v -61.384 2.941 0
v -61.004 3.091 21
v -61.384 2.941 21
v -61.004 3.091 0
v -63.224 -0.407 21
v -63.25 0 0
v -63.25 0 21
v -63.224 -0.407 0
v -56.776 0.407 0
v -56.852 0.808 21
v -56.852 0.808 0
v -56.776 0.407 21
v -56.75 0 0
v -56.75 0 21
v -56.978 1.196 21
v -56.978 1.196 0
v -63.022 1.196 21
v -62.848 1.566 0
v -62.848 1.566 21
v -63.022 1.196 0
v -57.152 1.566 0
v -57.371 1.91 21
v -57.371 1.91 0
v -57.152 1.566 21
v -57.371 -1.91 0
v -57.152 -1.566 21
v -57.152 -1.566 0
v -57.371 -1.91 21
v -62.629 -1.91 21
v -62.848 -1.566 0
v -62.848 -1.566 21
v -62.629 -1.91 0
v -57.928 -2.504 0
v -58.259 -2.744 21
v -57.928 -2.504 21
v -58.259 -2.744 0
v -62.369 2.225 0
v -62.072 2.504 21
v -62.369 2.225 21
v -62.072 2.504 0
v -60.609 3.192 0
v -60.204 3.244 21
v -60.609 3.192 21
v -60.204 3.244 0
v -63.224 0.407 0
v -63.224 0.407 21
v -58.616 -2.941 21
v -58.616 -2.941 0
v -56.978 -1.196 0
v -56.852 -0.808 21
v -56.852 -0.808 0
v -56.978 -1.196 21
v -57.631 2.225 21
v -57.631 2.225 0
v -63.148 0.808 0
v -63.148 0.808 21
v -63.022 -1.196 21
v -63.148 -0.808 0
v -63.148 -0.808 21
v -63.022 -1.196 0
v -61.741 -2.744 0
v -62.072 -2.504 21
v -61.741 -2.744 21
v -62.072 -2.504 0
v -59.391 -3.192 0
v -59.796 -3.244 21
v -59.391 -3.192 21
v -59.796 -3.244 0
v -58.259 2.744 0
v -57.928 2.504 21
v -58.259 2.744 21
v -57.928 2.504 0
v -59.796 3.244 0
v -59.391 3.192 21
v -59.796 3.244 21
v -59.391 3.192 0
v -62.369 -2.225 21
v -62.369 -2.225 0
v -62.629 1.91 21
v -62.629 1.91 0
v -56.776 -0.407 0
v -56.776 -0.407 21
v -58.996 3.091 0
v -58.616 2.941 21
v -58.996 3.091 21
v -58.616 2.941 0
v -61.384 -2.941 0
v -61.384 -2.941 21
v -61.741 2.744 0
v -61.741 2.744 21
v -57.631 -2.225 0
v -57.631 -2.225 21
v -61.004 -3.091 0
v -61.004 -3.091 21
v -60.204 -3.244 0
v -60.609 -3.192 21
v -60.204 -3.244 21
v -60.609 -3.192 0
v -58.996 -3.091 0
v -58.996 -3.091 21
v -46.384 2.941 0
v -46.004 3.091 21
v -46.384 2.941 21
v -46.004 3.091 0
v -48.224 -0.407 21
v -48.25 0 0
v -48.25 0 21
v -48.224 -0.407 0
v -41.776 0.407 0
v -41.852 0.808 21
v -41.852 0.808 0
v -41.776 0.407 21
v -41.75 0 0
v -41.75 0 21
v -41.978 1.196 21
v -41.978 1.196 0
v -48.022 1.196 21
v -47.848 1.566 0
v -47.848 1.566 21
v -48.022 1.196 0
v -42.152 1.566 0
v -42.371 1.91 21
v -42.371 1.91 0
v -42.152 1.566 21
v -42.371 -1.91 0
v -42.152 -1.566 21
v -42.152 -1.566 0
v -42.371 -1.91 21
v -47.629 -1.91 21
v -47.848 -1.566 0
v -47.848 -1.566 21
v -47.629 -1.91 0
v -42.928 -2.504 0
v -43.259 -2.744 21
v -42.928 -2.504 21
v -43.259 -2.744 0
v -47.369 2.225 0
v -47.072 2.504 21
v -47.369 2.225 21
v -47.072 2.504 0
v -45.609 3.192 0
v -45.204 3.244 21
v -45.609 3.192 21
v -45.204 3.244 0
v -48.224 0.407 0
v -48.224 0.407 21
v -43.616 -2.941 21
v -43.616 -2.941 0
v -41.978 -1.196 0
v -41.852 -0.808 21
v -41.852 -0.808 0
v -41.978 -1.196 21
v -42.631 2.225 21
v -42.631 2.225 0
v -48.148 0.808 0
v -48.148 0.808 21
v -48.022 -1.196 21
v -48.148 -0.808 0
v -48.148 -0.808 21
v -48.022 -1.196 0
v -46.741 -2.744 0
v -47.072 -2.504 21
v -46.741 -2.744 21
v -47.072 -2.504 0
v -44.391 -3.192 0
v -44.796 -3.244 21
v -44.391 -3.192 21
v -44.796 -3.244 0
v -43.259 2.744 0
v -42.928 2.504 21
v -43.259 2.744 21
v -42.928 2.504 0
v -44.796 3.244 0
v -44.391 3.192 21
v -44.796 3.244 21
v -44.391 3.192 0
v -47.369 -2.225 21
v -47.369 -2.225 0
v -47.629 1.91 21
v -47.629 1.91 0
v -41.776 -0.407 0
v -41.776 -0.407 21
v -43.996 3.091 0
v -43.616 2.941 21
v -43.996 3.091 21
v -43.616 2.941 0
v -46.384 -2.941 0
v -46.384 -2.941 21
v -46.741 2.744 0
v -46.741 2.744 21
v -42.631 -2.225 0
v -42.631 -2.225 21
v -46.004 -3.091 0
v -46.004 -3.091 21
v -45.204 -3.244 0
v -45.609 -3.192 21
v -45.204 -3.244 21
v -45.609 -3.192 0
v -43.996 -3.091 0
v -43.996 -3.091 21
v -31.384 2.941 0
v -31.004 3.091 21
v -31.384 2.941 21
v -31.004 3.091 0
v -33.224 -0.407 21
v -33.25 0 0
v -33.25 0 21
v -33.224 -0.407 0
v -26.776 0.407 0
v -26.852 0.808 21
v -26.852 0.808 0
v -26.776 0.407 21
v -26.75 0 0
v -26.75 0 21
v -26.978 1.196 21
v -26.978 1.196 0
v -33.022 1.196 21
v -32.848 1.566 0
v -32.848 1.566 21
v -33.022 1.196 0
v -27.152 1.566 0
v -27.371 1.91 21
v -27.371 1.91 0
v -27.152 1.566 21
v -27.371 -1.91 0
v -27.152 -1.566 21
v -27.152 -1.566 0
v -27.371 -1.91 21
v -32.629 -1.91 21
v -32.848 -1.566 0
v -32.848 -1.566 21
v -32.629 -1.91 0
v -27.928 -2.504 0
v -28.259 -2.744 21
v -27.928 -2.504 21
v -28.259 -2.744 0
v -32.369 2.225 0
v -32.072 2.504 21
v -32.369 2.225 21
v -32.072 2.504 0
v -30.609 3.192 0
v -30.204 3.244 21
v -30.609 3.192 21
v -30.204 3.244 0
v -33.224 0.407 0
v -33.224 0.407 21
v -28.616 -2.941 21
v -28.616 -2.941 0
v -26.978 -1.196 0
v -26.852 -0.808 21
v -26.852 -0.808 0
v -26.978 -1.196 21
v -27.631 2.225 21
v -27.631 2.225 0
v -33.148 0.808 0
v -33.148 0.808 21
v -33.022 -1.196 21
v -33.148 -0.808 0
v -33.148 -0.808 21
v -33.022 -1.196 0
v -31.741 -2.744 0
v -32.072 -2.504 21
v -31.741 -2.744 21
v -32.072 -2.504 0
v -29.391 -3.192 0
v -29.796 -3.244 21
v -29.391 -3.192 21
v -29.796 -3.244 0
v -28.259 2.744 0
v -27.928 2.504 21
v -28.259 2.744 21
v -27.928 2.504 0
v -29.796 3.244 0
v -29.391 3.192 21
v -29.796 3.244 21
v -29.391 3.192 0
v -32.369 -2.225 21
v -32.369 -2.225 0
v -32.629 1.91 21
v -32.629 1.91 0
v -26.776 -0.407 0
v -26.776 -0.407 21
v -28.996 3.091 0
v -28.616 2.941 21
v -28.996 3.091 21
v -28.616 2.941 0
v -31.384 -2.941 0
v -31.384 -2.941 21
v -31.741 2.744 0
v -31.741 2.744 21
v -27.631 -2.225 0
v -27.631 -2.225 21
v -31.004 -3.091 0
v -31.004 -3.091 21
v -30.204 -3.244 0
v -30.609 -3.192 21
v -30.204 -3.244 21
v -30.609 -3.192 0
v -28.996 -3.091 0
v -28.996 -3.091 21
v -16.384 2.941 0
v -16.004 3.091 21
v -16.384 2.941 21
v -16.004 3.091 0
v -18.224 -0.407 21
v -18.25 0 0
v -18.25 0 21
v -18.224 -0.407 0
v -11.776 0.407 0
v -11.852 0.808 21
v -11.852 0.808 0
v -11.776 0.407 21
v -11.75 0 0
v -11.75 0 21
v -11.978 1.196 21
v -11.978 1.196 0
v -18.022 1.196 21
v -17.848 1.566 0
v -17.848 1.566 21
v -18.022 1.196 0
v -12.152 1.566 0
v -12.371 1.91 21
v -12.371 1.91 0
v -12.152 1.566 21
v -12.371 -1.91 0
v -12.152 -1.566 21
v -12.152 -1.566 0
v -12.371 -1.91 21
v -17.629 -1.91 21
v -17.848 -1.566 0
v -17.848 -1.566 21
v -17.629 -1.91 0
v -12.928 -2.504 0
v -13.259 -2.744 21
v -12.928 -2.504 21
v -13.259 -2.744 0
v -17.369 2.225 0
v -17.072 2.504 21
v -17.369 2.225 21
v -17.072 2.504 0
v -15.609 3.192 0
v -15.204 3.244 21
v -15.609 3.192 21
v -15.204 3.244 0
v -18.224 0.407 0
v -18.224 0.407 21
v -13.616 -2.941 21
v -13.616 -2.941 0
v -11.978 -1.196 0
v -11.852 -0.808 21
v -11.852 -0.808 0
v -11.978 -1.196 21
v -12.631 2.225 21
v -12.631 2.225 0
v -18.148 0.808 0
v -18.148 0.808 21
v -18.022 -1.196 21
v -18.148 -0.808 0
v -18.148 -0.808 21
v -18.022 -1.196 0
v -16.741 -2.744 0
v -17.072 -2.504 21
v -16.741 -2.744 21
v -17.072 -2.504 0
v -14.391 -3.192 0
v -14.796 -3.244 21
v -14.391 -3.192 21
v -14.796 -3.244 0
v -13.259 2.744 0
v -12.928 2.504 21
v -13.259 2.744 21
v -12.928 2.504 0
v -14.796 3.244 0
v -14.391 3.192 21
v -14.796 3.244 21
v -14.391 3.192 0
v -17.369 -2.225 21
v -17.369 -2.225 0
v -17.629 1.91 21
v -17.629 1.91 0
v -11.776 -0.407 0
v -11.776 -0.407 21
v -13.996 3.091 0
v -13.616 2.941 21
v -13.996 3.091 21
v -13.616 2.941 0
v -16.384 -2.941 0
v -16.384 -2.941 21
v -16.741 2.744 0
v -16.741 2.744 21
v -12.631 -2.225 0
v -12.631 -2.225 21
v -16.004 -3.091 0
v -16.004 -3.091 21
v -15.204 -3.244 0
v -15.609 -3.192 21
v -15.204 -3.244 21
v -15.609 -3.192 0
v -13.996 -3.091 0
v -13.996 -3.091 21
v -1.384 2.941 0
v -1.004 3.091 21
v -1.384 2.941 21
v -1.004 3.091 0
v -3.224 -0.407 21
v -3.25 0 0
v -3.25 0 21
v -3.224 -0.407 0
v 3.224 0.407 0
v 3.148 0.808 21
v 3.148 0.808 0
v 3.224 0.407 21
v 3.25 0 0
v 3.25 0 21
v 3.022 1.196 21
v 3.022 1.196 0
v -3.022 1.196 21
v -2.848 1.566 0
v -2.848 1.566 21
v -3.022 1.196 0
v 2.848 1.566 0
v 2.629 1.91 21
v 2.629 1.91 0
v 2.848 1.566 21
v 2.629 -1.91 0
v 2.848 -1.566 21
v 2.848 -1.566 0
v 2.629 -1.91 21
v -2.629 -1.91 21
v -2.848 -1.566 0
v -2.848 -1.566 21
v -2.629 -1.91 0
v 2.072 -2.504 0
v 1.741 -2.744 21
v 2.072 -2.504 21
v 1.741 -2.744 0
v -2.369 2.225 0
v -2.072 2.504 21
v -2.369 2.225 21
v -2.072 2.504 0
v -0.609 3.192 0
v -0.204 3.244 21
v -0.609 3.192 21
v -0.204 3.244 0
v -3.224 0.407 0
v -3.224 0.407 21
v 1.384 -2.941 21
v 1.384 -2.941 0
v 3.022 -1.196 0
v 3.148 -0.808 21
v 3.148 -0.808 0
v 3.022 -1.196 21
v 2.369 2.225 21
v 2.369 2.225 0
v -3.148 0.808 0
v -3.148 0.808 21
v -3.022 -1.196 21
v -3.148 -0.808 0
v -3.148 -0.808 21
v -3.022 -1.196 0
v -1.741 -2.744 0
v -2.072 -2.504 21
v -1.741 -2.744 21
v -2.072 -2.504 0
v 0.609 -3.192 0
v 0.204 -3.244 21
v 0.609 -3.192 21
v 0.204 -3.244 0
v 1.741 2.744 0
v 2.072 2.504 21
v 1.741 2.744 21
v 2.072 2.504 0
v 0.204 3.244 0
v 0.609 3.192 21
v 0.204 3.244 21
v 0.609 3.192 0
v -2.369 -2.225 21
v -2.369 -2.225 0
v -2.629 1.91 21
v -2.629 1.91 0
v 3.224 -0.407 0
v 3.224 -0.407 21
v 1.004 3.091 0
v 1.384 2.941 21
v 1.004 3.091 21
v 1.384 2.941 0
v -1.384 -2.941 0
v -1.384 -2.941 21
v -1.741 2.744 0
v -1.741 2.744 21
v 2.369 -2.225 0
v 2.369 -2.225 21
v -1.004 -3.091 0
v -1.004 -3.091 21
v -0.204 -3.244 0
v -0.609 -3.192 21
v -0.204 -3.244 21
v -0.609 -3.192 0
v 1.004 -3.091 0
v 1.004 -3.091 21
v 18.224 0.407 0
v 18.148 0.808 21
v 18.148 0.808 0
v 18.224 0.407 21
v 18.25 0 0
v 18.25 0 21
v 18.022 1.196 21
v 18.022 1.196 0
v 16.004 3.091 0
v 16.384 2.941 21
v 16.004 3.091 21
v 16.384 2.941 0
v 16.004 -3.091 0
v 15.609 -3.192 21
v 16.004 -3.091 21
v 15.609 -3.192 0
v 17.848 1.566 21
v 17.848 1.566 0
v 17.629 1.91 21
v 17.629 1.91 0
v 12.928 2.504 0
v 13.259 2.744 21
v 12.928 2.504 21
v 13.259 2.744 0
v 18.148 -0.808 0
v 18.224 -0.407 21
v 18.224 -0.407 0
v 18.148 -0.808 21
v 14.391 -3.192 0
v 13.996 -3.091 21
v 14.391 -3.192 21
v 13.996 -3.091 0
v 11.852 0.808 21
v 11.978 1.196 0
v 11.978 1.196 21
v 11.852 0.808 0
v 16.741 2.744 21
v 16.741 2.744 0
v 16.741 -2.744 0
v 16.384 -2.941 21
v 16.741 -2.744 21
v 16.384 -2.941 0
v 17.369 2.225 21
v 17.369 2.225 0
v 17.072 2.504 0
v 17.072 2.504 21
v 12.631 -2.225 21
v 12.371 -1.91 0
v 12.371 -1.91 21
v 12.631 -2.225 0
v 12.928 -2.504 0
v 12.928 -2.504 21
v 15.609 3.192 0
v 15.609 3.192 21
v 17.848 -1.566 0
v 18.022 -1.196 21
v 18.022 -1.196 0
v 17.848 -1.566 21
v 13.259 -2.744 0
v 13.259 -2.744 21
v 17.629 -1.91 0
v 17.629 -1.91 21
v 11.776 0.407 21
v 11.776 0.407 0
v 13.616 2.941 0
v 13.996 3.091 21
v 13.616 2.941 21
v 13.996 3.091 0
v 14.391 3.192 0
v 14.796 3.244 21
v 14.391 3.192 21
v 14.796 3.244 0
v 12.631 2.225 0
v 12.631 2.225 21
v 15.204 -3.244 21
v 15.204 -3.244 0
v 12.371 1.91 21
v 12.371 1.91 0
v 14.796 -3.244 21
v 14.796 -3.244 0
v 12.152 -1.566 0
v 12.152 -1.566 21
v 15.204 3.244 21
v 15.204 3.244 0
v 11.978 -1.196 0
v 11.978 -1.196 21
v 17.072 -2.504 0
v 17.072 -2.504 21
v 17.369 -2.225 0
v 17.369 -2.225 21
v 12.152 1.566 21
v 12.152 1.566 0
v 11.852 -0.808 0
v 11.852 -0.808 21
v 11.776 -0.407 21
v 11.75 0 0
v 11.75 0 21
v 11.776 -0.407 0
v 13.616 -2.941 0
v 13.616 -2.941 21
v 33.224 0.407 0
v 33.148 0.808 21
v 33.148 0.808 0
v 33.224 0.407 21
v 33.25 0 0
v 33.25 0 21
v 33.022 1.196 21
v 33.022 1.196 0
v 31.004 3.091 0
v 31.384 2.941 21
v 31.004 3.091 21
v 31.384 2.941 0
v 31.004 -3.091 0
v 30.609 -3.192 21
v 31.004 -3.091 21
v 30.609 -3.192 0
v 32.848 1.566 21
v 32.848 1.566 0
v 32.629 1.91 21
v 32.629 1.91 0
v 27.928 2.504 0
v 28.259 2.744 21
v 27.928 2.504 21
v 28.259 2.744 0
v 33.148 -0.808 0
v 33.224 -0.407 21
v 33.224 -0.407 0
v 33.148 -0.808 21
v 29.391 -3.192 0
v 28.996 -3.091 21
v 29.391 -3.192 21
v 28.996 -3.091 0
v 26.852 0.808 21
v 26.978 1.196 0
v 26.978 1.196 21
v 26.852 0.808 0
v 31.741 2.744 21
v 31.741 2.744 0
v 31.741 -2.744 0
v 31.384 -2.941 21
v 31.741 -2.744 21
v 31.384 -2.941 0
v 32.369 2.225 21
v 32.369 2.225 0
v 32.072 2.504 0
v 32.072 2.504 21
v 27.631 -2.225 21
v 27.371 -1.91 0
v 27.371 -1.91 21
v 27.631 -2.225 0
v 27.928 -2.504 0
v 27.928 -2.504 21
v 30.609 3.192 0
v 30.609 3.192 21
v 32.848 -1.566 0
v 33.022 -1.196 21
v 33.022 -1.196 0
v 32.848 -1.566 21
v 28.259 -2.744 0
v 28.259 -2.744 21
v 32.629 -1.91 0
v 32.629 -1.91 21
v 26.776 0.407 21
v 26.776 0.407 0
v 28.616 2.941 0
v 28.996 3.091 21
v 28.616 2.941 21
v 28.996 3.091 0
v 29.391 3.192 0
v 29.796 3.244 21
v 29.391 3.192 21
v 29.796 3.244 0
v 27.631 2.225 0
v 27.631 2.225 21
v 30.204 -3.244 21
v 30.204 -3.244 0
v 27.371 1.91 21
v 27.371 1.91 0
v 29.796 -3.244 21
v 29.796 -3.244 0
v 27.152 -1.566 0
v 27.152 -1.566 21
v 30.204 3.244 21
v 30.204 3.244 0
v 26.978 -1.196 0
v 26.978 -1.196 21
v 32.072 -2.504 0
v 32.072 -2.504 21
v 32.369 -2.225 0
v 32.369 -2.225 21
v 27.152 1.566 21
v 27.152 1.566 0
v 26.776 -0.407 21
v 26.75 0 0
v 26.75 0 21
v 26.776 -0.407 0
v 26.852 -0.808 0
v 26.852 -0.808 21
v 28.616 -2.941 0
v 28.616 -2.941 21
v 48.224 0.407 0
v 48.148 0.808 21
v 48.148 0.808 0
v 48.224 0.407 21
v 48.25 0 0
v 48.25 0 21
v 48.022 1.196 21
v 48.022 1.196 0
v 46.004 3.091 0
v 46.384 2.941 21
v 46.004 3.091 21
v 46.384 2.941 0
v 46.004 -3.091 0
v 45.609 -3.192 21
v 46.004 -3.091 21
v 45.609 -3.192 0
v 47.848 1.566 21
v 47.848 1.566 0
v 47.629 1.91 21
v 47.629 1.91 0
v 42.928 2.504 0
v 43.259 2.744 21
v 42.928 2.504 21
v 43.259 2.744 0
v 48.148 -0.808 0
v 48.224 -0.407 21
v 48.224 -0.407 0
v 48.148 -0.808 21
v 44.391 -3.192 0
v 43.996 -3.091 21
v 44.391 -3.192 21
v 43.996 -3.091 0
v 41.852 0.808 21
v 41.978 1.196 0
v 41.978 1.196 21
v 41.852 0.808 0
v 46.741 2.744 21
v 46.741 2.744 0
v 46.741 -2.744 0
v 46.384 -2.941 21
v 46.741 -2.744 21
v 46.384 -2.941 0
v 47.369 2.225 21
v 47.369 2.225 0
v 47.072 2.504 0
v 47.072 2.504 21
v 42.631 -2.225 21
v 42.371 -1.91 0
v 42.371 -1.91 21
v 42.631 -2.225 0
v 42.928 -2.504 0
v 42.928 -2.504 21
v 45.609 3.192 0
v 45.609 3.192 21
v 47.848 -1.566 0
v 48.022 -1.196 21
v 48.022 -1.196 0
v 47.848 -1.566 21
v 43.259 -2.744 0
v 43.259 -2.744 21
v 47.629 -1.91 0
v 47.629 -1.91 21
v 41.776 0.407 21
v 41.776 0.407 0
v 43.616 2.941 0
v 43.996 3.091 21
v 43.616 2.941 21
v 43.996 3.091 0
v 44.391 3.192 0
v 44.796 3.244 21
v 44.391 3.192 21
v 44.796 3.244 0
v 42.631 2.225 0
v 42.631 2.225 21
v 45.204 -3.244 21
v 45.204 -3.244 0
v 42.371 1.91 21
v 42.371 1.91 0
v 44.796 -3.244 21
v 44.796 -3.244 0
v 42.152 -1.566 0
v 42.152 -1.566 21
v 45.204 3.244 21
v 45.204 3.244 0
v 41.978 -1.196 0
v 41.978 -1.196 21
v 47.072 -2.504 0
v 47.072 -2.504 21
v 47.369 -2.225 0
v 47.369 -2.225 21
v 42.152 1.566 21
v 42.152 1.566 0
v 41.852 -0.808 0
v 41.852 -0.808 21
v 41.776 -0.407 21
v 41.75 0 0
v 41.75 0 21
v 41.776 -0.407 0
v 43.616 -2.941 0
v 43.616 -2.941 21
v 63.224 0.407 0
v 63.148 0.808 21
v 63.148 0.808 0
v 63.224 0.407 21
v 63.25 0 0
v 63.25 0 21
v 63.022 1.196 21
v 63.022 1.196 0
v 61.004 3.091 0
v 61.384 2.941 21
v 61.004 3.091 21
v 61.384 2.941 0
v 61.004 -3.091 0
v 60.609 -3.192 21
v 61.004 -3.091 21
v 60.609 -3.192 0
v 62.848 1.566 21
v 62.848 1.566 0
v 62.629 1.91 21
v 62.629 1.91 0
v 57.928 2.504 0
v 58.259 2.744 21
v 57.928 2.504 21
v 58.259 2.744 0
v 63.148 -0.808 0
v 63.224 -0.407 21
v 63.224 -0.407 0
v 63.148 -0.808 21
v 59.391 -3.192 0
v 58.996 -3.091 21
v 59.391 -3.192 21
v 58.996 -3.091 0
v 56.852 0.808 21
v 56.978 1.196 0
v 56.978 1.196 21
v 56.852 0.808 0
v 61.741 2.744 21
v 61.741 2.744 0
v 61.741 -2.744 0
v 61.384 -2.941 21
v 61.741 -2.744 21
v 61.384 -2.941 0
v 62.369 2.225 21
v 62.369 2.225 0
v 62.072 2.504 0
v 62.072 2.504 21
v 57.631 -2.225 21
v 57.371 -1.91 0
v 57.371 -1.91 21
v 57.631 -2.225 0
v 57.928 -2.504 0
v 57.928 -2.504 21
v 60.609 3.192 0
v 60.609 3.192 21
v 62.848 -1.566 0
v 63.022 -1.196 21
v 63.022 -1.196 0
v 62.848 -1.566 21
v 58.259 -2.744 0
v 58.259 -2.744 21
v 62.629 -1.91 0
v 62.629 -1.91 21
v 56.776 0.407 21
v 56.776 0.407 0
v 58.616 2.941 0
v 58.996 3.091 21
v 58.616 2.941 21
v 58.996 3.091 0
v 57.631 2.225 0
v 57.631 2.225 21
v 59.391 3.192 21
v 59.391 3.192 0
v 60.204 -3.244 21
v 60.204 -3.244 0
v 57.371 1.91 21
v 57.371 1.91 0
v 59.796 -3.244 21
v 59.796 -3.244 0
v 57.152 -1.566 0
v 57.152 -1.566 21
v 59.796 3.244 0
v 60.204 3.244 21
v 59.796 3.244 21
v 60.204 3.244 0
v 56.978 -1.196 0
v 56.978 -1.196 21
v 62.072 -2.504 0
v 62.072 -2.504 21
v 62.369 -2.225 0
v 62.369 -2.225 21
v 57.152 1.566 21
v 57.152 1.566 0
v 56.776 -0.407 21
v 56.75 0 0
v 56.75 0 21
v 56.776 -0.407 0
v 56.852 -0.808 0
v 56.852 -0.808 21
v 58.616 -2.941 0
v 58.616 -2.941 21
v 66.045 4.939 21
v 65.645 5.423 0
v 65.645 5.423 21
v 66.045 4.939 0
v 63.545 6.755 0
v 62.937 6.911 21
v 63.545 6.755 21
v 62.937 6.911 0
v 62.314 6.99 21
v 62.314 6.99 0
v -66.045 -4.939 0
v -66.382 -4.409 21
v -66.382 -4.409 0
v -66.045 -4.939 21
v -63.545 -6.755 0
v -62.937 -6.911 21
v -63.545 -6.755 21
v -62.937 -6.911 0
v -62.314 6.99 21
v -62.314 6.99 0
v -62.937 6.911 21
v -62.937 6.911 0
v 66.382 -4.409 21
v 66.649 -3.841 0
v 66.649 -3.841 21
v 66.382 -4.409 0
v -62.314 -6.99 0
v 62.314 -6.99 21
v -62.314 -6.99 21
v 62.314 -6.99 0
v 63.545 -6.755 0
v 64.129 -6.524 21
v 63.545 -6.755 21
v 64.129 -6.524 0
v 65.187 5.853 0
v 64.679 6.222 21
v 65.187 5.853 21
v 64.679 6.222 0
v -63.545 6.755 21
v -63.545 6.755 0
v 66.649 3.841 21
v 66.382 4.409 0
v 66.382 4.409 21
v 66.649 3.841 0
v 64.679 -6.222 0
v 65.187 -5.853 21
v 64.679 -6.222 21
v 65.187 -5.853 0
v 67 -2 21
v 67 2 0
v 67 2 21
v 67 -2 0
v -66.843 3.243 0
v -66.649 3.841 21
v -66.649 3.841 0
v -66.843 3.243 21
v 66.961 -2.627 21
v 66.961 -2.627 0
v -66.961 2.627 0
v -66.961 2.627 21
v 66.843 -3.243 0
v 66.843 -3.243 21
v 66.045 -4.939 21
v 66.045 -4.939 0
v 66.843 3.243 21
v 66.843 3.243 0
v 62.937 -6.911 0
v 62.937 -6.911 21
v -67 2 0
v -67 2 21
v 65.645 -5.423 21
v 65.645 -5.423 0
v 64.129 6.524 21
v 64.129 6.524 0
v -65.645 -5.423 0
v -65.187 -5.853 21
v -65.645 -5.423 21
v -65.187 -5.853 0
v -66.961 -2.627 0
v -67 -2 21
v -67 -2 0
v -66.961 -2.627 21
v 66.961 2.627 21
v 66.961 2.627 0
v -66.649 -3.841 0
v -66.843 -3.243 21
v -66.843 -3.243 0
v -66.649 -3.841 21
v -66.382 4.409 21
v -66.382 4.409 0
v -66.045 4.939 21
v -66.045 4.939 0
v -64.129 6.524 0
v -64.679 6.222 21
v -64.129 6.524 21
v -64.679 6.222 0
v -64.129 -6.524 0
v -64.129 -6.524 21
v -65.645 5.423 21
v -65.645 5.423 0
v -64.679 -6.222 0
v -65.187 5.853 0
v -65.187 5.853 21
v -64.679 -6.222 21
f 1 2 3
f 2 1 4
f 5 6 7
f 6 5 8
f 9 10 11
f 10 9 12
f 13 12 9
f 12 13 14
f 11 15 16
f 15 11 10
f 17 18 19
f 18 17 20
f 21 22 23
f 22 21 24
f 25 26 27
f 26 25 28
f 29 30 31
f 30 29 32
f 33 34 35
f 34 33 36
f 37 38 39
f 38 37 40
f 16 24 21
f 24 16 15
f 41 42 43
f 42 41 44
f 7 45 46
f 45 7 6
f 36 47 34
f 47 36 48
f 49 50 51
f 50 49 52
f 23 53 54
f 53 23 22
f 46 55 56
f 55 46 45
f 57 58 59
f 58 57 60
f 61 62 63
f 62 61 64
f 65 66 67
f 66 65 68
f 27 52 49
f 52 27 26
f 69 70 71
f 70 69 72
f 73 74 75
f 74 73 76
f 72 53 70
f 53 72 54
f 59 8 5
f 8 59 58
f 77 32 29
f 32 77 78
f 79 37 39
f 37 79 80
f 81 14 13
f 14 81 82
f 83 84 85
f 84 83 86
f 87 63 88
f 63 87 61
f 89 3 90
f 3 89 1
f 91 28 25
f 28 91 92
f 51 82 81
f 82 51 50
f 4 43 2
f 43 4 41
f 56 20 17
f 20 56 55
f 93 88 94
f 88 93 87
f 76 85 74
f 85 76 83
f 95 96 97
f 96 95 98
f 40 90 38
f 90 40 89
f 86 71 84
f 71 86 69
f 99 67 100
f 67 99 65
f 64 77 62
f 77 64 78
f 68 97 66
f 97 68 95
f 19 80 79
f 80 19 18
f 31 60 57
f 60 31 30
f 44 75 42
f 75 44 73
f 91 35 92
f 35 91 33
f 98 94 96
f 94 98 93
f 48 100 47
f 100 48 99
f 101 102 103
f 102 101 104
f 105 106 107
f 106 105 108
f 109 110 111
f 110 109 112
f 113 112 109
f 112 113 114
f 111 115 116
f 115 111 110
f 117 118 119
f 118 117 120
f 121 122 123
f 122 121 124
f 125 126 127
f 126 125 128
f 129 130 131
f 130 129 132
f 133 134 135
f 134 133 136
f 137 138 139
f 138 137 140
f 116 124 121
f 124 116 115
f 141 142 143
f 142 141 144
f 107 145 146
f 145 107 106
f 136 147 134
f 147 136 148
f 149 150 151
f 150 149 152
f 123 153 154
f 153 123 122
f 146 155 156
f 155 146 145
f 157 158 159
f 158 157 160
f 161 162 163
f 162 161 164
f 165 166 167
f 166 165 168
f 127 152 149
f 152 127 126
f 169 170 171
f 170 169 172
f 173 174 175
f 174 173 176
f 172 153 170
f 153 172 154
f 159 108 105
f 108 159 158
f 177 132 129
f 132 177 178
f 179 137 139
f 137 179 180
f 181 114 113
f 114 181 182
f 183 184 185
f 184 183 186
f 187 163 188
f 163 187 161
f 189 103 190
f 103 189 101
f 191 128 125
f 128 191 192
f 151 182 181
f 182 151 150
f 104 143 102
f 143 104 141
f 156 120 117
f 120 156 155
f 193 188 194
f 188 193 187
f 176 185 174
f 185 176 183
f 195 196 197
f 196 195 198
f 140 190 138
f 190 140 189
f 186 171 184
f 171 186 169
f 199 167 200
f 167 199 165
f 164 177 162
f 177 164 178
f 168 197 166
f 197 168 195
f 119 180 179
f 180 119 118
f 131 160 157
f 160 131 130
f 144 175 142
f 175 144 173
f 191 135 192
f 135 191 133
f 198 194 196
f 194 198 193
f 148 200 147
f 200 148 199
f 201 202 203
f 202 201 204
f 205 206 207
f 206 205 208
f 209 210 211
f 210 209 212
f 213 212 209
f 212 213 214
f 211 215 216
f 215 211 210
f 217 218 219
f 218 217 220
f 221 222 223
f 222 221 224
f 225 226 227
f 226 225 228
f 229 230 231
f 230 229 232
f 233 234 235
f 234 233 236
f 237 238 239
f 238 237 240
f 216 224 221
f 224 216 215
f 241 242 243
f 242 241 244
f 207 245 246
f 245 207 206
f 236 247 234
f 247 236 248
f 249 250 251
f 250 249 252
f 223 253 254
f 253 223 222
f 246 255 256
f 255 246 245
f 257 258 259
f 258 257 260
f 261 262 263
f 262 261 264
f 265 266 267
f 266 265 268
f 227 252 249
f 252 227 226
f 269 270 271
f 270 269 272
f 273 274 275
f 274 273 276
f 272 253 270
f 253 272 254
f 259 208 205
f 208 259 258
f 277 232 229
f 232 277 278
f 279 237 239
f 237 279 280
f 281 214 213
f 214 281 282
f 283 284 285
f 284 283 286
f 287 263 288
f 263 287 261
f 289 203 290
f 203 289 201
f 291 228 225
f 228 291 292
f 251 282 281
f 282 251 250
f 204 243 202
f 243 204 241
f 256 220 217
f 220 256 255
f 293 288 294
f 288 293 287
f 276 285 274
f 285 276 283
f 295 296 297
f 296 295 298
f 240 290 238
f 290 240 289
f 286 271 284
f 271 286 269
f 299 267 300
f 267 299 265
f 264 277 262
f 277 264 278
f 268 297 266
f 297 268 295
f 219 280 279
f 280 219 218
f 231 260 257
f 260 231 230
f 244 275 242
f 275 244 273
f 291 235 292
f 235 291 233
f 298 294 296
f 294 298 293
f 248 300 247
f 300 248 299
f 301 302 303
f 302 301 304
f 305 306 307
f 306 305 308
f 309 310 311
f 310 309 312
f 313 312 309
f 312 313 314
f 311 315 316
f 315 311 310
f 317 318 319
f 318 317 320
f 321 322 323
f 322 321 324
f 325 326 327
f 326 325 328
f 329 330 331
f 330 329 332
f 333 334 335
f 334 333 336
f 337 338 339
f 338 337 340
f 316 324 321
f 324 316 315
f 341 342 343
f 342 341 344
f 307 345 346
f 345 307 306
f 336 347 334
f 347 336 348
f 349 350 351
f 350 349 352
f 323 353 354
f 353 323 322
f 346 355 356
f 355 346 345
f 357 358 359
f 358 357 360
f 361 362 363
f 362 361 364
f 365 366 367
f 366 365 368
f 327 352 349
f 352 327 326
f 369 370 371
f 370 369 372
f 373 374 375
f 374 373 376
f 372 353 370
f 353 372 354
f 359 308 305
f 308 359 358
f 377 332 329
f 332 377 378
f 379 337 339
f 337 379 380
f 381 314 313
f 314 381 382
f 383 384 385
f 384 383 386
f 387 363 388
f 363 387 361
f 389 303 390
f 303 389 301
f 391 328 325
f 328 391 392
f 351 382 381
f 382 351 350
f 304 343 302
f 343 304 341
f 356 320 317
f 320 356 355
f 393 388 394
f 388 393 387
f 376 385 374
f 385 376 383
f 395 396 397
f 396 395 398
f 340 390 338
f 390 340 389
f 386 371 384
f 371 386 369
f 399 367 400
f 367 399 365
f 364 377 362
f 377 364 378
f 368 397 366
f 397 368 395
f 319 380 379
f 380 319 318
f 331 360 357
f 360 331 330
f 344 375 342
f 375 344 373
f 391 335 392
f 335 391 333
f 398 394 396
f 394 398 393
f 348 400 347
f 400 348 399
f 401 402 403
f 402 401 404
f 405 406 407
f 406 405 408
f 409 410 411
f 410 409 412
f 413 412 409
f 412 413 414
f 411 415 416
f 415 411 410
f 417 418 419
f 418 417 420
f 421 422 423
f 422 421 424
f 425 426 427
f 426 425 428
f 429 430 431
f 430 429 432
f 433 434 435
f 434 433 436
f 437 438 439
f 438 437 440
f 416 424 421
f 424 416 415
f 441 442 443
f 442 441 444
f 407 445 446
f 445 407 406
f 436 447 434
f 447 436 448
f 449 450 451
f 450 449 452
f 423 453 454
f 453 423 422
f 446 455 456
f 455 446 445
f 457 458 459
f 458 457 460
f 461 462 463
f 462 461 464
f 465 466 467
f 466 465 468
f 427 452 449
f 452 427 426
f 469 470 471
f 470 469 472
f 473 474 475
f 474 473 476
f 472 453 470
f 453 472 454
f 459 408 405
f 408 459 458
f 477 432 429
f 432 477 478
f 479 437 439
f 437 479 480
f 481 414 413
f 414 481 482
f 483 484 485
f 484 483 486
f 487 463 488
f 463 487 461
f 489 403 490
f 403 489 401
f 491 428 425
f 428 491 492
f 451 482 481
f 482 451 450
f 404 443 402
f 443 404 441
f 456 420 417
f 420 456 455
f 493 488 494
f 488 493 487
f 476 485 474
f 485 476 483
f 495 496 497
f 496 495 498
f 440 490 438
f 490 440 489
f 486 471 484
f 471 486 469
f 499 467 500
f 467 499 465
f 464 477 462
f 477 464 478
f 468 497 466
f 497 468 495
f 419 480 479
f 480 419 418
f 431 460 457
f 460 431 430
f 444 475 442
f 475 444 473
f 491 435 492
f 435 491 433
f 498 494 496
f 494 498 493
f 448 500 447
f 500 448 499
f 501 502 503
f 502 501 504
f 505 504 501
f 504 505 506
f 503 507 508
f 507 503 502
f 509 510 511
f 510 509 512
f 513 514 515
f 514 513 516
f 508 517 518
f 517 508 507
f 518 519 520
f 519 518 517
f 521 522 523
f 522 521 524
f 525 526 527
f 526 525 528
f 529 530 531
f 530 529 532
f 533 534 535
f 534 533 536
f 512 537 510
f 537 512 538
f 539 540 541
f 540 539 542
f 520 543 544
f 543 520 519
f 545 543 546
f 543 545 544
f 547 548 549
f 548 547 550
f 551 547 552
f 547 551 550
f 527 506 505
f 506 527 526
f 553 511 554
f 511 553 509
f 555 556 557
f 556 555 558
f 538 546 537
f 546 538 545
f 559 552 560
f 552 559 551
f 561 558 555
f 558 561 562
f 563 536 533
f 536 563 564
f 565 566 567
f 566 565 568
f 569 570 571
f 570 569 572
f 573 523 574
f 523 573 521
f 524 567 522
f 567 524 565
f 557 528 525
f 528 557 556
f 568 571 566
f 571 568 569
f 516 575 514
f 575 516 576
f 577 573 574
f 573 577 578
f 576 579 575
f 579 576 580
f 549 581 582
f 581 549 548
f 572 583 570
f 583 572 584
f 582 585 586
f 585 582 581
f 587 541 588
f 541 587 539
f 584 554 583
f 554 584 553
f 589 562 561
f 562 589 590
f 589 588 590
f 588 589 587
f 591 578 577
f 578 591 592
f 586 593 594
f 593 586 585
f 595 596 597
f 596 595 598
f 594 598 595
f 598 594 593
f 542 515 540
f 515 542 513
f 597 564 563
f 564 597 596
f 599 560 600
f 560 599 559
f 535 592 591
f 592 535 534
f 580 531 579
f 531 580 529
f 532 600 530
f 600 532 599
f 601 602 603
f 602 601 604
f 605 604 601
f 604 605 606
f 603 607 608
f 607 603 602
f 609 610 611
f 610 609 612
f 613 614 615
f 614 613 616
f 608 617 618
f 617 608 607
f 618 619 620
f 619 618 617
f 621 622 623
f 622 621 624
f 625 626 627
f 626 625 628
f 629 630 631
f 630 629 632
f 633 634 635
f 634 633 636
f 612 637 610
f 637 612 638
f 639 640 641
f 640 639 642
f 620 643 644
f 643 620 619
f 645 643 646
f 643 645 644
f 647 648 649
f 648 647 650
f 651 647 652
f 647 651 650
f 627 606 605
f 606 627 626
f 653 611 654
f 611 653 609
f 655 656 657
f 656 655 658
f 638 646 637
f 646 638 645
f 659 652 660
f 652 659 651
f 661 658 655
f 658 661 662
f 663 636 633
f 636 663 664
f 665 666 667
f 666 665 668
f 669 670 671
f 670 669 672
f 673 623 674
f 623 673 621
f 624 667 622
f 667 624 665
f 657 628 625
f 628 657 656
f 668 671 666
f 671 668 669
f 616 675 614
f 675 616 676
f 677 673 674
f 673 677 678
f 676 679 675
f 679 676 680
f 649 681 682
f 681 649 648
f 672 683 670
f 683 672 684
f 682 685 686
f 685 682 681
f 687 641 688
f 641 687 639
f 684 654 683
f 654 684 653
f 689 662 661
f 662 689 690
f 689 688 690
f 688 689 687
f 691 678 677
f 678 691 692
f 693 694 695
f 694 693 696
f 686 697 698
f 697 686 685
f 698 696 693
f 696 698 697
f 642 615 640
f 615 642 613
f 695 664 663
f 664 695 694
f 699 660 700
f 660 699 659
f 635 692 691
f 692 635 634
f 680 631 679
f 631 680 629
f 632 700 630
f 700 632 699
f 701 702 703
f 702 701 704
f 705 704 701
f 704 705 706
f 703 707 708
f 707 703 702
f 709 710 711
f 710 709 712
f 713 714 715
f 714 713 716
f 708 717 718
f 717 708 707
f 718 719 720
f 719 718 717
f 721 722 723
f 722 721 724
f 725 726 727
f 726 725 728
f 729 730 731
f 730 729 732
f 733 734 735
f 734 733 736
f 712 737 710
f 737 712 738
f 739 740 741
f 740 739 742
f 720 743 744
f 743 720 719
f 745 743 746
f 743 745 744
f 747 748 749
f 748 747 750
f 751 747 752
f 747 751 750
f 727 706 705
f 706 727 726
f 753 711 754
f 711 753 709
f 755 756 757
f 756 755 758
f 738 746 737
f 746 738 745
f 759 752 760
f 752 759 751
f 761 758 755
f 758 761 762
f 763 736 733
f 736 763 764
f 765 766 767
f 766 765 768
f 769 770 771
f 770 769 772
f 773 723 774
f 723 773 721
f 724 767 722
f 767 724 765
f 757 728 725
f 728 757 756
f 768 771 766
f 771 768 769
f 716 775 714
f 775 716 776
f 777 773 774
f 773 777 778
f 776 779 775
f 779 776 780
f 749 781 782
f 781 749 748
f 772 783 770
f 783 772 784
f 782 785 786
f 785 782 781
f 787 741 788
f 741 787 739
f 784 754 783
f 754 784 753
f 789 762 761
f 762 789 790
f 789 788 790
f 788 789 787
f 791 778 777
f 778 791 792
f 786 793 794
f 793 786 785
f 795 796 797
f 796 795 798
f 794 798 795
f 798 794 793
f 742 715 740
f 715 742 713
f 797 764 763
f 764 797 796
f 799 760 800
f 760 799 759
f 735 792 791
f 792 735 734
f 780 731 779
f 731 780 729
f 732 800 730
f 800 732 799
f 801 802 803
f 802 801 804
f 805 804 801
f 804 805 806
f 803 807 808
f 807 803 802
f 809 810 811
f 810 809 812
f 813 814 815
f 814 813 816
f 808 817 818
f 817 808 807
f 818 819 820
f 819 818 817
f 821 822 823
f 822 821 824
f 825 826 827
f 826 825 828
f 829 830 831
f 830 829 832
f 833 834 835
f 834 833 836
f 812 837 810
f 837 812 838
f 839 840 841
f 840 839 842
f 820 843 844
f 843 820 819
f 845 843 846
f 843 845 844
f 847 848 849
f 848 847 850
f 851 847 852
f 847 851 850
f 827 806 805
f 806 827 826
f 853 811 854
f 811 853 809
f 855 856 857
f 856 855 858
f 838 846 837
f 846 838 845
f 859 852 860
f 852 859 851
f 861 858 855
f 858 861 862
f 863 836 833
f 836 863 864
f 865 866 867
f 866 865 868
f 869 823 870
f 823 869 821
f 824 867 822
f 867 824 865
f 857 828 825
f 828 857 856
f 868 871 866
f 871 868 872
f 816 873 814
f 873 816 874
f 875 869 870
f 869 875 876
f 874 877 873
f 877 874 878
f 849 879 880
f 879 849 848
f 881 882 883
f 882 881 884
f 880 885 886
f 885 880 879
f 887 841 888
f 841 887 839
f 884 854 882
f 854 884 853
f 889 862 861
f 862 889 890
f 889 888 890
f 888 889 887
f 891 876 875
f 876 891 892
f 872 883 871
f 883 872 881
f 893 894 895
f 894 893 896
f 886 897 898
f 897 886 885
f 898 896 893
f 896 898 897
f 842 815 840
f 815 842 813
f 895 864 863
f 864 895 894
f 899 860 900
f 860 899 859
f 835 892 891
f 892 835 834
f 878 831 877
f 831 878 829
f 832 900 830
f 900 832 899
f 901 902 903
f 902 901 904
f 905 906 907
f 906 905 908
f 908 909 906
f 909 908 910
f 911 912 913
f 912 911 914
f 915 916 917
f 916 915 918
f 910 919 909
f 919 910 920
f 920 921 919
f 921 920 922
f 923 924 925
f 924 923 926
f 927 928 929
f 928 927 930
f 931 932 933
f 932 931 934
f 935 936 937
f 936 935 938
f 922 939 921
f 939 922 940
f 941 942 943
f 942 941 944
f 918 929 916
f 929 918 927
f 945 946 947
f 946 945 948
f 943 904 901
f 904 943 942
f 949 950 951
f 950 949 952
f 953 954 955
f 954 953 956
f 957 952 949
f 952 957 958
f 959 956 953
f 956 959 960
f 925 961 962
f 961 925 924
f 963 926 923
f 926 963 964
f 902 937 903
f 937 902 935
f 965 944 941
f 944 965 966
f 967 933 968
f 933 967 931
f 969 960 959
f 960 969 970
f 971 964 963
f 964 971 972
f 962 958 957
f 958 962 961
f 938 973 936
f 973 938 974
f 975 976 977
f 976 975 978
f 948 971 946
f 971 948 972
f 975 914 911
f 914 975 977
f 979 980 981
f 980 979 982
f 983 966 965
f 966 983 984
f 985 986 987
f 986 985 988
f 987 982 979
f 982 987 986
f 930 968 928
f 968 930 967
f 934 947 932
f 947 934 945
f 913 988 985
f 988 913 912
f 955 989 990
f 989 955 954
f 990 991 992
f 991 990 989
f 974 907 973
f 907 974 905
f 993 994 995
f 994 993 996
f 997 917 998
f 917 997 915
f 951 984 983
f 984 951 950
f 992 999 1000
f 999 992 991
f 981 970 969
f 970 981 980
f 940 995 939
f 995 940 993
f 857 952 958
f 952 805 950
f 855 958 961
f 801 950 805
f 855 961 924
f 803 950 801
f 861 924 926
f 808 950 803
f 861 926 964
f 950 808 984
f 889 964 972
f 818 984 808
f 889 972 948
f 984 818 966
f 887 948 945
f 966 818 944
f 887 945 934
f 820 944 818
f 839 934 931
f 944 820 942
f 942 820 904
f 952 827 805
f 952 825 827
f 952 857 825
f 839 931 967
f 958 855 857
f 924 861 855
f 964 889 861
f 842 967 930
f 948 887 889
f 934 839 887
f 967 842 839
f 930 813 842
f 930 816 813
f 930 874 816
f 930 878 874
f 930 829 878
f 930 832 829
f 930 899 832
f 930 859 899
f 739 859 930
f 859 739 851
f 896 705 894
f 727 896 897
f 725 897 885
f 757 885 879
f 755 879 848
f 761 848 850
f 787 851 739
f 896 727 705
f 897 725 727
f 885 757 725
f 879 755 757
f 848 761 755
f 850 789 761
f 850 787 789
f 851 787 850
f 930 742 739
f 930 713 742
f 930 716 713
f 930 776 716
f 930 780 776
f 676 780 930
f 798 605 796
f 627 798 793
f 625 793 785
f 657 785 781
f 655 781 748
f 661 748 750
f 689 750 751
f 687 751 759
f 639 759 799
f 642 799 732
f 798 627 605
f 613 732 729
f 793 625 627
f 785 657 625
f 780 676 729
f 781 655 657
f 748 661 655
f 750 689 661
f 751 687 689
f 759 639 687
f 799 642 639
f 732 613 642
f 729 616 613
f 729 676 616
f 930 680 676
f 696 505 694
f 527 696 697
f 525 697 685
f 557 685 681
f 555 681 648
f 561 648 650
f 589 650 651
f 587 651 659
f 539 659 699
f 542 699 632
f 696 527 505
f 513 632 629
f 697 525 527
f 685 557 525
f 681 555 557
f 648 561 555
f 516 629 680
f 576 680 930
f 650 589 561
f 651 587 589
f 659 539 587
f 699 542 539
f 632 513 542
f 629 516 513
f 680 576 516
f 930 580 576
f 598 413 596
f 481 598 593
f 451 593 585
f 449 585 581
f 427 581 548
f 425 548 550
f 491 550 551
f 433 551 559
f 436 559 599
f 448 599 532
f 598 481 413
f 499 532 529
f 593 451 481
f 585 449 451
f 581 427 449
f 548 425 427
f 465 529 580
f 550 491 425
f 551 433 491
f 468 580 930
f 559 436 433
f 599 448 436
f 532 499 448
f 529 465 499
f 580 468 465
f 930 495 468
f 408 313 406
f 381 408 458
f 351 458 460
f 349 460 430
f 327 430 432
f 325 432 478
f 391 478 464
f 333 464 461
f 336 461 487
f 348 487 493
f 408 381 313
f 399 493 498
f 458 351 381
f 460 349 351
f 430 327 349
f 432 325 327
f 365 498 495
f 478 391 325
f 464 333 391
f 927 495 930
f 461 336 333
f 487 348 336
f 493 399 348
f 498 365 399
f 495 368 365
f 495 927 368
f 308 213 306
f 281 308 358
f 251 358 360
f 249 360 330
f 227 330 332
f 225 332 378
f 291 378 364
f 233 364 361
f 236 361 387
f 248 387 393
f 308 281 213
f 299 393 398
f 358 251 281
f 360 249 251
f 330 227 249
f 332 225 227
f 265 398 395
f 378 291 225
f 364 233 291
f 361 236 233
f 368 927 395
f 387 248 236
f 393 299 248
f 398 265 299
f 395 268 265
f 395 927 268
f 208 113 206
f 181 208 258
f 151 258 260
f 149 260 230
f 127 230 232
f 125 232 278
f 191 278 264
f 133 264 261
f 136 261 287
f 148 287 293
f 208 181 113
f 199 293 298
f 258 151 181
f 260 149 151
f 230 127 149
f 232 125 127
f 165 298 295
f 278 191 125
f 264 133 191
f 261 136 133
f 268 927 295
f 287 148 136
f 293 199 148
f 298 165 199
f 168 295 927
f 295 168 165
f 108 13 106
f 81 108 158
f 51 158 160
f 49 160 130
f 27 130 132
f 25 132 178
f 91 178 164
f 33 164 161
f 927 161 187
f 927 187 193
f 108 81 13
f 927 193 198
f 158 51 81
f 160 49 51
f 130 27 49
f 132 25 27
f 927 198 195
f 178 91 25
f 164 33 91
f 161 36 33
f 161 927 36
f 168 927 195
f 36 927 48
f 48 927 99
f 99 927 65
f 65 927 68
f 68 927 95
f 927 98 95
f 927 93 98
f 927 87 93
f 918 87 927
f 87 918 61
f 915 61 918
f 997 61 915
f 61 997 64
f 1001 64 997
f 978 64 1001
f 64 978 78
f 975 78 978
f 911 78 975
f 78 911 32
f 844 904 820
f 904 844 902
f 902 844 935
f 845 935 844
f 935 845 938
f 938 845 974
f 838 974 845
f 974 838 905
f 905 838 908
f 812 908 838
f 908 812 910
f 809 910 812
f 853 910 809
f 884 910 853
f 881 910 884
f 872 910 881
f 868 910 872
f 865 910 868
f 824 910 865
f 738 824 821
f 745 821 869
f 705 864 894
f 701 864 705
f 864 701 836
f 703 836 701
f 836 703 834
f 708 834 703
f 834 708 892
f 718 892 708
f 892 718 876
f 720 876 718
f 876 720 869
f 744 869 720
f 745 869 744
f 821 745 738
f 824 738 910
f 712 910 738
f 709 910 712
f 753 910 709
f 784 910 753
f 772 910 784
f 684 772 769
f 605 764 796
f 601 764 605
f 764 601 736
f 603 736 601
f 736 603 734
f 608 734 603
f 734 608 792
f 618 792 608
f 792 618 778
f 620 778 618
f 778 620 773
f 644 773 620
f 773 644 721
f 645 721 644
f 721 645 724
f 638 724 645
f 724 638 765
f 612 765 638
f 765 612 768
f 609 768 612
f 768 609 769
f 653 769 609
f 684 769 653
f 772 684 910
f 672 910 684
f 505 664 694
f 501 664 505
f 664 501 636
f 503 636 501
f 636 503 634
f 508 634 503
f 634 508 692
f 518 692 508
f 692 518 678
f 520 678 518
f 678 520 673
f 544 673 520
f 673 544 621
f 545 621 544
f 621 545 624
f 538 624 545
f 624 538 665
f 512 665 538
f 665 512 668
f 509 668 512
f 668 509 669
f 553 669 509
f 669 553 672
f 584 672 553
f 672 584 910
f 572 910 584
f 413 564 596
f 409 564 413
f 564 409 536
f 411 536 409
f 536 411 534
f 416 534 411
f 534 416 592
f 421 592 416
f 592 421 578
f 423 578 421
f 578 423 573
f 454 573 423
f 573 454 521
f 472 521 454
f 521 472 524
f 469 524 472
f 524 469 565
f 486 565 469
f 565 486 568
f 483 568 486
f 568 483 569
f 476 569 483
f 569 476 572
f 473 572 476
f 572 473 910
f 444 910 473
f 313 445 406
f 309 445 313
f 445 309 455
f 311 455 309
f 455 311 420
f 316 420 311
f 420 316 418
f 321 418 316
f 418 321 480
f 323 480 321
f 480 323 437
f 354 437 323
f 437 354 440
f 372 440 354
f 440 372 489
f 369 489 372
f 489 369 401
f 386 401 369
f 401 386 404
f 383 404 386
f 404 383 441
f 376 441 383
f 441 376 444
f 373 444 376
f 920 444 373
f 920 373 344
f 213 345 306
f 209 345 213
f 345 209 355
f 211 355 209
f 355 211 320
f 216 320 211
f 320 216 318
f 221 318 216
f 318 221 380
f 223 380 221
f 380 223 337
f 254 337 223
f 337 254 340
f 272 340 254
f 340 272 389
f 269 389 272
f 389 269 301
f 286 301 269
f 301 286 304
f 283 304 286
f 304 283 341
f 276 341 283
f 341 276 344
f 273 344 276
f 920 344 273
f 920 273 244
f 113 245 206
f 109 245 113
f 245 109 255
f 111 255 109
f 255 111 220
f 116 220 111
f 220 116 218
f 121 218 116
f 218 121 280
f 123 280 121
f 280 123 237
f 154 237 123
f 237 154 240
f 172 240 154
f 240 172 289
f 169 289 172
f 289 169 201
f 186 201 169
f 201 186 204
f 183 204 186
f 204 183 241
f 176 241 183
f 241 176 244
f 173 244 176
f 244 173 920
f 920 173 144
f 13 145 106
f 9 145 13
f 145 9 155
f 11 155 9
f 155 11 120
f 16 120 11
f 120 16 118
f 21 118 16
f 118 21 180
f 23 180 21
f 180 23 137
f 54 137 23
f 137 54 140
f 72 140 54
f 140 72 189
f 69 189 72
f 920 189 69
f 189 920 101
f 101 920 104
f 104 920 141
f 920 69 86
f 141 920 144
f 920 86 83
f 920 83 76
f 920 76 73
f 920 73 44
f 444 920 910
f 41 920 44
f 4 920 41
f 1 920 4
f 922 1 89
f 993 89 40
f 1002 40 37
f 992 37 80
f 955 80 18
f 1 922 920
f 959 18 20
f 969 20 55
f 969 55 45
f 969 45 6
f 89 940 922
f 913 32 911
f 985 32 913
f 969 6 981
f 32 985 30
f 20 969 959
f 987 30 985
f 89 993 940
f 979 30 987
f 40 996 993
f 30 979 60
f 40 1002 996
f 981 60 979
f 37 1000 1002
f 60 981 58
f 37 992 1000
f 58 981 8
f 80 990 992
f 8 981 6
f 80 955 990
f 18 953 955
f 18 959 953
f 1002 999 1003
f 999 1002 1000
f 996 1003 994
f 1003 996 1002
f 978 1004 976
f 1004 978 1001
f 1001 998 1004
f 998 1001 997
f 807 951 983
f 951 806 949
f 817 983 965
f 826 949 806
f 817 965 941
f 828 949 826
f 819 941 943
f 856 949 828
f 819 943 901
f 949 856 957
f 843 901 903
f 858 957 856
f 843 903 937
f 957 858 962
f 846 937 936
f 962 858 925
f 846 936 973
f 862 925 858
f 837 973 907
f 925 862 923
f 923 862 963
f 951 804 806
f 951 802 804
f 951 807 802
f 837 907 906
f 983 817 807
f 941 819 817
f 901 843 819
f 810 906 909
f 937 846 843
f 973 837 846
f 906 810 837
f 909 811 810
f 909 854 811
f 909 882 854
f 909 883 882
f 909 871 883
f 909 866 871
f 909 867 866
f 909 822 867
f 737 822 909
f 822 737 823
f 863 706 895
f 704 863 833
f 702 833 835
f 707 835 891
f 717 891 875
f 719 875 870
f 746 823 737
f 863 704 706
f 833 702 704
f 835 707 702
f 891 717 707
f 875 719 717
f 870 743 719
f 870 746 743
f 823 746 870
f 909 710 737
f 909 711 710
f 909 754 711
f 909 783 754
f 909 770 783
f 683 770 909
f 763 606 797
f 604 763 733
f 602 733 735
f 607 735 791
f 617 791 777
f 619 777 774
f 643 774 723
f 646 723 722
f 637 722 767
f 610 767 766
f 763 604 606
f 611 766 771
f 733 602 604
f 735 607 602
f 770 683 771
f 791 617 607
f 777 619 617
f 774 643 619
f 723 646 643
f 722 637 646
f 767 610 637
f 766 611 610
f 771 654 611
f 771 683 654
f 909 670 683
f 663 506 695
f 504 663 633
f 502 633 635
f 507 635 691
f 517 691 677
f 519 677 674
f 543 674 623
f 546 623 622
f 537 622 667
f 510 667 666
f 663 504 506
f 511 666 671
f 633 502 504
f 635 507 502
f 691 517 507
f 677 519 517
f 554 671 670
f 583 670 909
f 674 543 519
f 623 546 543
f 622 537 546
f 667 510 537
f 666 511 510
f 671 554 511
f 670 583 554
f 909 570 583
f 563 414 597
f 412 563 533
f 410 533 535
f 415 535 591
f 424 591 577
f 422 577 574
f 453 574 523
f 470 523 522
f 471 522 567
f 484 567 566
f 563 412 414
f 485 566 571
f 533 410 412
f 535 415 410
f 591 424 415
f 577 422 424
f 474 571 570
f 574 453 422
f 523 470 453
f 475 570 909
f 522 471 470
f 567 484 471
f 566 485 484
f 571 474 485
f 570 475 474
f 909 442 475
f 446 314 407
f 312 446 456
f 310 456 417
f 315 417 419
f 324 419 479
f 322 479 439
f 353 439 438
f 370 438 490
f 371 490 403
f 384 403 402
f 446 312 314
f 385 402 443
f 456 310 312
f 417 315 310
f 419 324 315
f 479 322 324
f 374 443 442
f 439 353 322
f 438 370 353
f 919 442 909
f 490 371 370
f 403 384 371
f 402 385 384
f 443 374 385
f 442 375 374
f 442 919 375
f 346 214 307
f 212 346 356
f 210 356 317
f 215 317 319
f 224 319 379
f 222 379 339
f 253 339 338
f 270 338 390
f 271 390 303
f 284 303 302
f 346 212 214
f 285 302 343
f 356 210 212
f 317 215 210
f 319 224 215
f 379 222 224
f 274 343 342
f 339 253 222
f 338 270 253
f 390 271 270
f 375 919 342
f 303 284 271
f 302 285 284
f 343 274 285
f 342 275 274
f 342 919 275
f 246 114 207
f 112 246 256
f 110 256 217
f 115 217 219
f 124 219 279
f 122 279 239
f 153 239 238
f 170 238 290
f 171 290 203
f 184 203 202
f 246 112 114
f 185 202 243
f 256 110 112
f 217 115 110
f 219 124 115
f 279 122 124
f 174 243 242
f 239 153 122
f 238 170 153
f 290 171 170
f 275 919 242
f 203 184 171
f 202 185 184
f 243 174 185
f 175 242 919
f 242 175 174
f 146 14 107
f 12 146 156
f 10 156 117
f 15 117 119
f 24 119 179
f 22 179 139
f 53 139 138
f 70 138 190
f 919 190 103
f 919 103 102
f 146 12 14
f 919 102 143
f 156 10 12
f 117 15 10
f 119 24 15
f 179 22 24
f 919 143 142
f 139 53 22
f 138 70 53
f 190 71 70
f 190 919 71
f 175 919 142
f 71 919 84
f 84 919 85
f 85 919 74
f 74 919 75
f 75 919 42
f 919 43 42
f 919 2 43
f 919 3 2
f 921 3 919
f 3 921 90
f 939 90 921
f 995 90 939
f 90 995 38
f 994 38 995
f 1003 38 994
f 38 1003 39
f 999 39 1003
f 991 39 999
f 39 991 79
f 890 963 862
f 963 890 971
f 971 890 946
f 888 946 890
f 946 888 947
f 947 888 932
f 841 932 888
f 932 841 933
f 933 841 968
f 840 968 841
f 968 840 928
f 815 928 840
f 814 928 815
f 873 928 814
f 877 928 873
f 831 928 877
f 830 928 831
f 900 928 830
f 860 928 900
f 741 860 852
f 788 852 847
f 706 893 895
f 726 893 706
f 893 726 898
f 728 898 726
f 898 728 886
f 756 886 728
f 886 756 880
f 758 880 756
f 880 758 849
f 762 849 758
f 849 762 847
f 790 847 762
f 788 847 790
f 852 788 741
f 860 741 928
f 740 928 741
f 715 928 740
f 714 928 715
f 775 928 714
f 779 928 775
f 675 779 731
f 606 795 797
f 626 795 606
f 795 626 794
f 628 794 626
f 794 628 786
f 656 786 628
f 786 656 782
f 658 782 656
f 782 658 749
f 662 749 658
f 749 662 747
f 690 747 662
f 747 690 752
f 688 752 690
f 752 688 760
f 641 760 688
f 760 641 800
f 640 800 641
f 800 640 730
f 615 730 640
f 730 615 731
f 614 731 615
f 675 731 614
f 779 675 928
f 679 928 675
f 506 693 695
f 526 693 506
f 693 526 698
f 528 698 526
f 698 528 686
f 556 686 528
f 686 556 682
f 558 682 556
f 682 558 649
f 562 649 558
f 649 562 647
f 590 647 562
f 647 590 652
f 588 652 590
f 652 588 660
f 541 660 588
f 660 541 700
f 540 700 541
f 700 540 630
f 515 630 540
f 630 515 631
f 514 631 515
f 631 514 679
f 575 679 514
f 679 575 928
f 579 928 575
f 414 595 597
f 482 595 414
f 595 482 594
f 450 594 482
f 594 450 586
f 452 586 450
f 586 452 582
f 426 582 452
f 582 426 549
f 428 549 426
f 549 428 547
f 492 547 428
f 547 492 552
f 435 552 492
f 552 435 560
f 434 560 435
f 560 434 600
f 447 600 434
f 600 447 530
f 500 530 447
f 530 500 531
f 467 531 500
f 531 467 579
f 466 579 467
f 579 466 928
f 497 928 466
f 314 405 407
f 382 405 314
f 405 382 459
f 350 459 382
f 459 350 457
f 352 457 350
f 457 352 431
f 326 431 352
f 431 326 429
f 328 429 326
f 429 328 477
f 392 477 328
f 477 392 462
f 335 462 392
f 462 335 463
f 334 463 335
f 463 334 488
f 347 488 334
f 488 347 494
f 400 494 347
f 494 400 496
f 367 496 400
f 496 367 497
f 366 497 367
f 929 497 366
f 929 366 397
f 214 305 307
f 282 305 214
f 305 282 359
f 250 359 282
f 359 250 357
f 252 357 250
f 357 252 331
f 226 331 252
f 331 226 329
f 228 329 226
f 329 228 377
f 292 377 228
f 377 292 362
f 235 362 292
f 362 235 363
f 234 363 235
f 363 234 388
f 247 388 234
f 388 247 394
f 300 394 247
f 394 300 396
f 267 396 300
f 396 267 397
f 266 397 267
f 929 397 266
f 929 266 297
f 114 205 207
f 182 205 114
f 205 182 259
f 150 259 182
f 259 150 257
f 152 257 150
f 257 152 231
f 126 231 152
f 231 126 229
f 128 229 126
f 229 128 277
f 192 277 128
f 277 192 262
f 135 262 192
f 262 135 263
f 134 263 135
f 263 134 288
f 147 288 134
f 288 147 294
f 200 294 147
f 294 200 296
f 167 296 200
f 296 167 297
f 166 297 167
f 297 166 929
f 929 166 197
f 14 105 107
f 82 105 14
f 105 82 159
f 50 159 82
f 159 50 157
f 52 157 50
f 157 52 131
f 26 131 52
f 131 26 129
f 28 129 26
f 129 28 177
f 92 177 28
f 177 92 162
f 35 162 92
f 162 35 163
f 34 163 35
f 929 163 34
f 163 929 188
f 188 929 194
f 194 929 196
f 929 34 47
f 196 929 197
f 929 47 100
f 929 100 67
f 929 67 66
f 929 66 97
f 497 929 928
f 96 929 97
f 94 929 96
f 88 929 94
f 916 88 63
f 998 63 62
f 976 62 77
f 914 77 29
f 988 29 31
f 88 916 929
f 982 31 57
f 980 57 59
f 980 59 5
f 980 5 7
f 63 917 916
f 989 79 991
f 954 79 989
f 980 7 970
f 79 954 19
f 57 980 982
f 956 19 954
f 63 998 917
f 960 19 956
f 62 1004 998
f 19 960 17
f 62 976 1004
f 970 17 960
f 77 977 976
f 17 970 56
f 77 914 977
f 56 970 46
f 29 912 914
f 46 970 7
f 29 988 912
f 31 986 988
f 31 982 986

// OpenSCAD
$fn = 50;


difference() {
	union() {
		hull() {
			translate(v = [-62.0000000000, 2.0000000000, 0]) {
				cylinder(h = 21, r = 5);
			}
			translate(v = [62.0000000000, 2.0000000000, 0]) {
				cylinder(h = 21, r = 5);
			}
			translate(v = [-62.0000000000, -2.0000000000, 0]) {
				cylinder(h = 21, r = 5);
			}
			translate(v = [62.0000000000, -2.0000000000, 0]) {
				cylinder(h = 21, r = 5);
			}
		}
	}
	union() {
		translate(v = [-60.0000000000, 0.0000000000, -100.0000000000]) {
			cylinder(h = 200, r = 3.2500000000);
		}
		translate(v = [-45.0000000000, 0.0000000000, -100.0000000000]) {
			cylinder(h = 200, r = 3.2500000000);
		}
		translate(v = [-30.0000000000, 0.0000000000, -100.0000000000]) {
			cylinder(h = 200, r = 3.2500000000);
		}
		translate(v = [-15.0000000000, 0.0000000000, -100.0000000000]) {
			cylinder(h = 200, r = 3.2500000000);
		}
		translate(v = [0.0000000000, 0.0000000000, -100.0000000000]) {
			cylinder(h = 200, r = 3.2500000000);
		}
		translate(v = [15.0000000000, 0.0000000000, -100.0000000000]) {
			cylinder(h = 200, r = 3.2500000000);
		}
		translate(v = [30.0000000000, 0.0000000000, -100.0000000000]) {
			cylinder(h = 200, r = 3.2500000000);
		}
		translate(v = [45.0000000000, 0.0000000000, -100.0000000000]) {
			cylinder(h = 200, r = 3.2500000000);
		}
		translate(v = [60.0000000000, 0.0000000000, -100.0000000000]) {
			cylinder(h = 200, r = 3.2500000000);
		}
	}
}
